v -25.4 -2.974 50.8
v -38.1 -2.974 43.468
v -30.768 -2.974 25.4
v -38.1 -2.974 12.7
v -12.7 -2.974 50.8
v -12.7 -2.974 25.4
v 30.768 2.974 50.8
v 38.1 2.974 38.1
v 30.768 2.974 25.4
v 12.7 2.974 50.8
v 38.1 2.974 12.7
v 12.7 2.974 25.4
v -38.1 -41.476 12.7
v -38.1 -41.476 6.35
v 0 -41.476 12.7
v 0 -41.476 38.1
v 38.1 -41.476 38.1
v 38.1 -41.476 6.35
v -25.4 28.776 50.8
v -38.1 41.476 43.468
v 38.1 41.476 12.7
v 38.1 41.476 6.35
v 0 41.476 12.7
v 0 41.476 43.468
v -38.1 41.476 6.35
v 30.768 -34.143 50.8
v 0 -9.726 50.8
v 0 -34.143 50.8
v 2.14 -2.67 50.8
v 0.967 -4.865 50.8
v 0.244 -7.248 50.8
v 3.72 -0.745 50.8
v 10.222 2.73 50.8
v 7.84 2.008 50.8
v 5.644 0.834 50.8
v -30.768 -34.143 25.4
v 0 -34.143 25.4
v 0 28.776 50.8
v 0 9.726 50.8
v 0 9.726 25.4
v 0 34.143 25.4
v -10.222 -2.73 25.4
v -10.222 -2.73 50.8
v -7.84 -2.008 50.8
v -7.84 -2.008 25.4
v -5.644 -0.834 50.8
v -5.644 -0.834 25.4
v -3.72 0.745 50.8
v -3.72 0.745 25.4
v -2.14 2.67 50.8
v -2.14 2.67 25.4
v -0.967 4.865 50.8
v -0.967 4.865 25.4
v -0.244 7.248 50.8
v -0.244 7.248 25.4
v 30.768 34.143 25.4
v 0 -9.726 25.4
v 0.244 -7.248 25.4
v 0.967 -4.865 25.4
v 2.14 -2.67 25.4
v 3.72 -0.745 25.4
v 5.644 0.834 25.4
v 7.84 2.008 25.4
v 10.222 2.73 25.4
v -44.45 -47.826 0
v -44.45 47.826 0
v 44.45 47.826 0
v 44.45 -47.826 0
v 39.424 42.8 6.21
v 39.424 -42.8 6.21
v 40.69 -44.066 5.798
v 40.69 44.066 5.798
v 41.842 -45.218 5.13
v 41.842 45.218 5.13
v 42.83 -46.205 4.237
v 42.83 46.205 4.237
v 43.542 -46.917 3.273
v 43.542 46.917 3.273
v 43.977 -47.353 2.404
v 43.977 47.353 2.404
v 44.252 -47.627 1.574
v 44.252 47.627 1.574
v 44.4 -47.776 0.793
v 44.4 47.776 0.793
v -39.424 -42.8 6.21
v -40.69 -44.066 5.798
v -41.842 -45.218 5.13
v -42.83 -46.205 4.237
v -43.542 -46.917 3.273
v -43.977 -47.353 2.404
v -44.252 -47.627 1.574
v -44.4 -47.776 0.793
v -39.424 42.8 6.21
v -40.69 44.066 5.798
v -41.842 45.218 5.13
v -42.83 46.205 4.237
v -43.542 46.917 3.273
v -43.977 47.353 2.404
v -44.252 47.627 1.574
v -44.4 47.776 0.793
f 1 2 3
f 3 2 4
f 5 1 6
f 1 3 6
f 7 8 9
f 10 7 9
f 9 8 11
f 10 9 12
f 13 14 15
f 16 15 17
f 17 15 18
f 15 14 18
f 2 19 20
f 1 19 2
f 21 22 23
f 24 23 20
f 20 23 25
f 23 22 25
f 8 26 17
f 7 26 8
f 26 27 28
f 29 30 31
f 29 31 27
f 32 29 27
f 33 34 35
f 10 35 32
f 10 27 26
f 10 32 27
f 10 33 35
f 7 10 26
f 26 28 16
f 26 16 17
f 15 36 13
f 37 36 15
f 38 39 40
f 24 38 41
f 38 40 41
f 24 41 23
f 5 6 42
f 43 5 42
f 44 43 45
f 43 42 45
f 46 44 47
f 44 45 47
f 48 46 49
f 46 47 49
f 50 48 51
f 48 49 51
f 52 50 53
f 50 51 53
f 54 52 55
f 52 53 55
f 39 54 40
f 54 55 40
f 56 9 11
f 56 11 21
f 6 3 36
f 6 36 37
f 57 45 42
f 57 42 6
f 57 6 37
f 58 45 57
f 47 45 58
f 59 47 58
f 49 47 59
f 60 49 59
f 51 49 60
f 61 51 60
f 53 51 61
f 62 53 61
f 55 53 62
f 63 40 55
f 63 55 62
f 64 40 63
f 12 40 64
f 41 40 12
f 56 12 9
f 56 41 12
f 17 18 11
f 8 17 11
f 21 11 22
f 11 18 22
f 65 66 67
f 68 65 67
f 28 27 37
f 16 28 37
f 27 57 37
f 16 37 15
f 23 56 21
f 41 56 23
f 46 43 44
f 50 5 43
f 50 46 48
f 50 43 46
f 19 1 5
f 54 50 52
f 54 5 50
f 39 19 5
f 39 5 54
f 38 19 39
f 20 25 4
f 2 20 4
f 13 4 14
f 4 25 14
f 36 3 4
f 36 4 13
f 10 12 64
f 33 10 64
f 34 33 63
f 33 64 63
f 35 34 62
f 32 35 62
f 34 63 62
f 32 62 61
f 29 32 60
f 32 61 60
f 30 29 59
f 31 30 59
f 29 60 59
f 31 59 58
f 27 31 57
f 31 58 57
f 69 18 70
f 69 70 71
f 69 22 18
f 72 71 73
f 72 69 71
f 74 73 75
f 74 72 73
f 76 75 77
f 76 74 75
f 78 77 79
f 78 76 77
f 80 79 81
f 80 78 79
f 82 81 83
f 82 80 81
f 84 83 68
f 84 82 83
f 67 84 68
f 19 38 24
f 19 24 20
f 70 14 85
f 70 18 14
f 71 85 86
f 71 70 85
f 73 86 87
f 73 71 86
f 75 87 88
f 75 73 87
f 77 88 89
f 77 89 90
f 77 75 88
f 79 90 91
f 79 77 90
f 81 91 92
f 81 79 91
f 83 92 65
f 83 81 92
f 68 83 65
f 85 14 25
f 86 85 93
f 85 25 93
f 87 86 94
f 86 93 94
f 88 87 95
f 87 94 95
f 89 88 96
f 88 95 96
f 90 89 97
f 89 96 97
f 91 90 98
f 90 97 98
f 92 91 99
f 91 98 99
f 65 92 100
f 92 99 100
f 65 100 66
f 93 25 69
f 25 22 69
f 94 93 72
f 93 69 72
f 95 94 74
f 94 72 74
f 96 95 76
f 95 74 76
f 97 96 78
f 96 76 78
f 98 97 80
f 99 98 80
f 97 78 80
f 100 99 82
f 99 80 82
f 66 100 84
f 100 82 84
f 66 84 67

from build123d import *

# Parameters (mm, degrees)
F0_W        = 88.8999994576
F0_H        = 95.6510528922
F1_DEPTH    = 6.35
F2_DEPTH    = 25.4
F3_DEPTH    = 50.8
F4_R        = 6.34999
F5_SIZE2    = 7.3323484187
F5_SIZE     = 12.7
F6_C1_SIZE2 = 12.7
F6_C1_SIZE  = 7.3323484187
F6_C2_SIZE2 = 7.3323484187
F6_C2_SIZE  = 12.7
F6_C3_SIZE2 = 12.7
F6_C3_SIZE  = 7.3323484187
F6_C4_SIZE2 = 7.3323484187
F6_C4_SIZE  = 12.7


# Not quite as in the source:
# - a fillet or chamfer is up to 0.001 mm smaller than in the source, because OpenCascade refuses the exact size


with BuildPart() as f1:
    # F0 (on Top) → F1 (new body)
    with BuildSketch(Plane.XY):
        Rectangle(F0_W, F0_H)
        Polygon((-2.712e-07, 41.4755269885), (38.0999997288, 41.4755269885), (38.0999997288, 2.9744735539), (38.0999997288, -41.4755264461), (-2.712e-07, -41.4755264461), (-38.1000002712, -41.4755264461), (-38.1000002712, -2.9744730115), (-38.1000002712, 41.4755269885), align=None, mode=Mode.SUBTRACT)
    extrude(amount=F1_DEPTH)

    # F0 (on Top) → F2 (join)
    with BuildSketch(Plane.XY):
        with BuildLine():
            Line((38.0999997288, 2.9744735539), (38.0999997288, 41.4755269885))
            Line((38.0999997288, 41.4755269885), (-2.712e-07, 41.4755269885))
            Line((-2.712e-07, 41.4755269885), (-2.712e-07, 9.7255269885))
            ThreePointArc((-2.712e-07, 9.7255269885), (-3.7197441501, 0.7452708674), (-12.7000002712, -2.9744730115))
            Line((-12.7000002712, -2.9744730115), (-38.1000002712, -2.9744730115))
            Line((-38.1000002712, -2.9744730115), (-38.1000002712, -41.4755264461))
            Line((-38.1000002712, -41.4755264461), (-2.712e-07, -41.4755264461))
            Line((-2.712e-07, -41.4755264461), (-2.712e-07, -9.7255264461))
            ThreePointArc((-2.712e-07, -9.7255264461), (3.7197436077, -0.745270325), (12.6999997288, 2.9744735539))
            Line((12.6999997288, 2.9744735539), (38.0999997288, 2.9744735539))
        make_face()
    extrude(amount=F2_DEPTH)

    # F0 (on Top) → F3 (join)
    with BuildSketch(Plane.XY):
        with BuildLine():
            Line((-2.712e-07, 9.7255269885), (-2.712e-07, 41.4755269885))
            Line((-2.712e-07, 41.4755269885), (-38.1000002712, 41.4755269885))
            Line((-38.1000002712, 41.4755269885), (-38.1000002712, -2.9744730115))
            Line((-38.1000002712, -2.9744730115), (-12.7000002712, -2.9744730115))
            ThreePointArc((-12.7000002712, -2.9744730115), (-3.7197441501, 0.7452708674), (-2.712e-07, 9.7255269885))
        make_face()
        with BuildLine():
            Line((38.0999997288, -41.4755264461), (38.0999997288, 2.9744735539))
            Line((38.0999997288, 2.9744735539), (12.6999997288, 2.9744735539))
            ThreePointArc((12.6999997288, 2.9744735539), (3.7197436077, -0.745270325), (-2.712e-07, -9.7255264461))
            Line((-2.712e-07, -9.7255264461), (-2.712e-07, -41.4755264461))
            Line((-2.712e-07, -41.4755264461), (38.0999997288, -41.4755264461))
        make_face()
    extrude(amount=F3_DEPTH)

    # F4 (radius 6.35 in the source; OpenCascade refuses exactly that, so slightly less here)
    f4_edges = [f1.edges().sort_by_distance(p)[0] for p in [
        (44.45, 0, 6.35),
        (0, -47.825526, 6.35),
        (0, 47.825526, 6.35),
        (-44.45, 0, 6.35),
    ]]
    fillet(f4_edges, radius=F4_R)

    # F5
    f5_edges = [f1.edges().sort_by_distance(p)[0] for p in [
        (38.1, 22.225, 25.4),
        (19.05, 41.475527, 25.4),
        (-38.1, -22.225, 25.4),
        (-19.05, -41.475526, 25.4),
    ]]
    chamfer(f5_edges, length=F5_SIZE, length2=F5_SIZE2)

    # F6: chamfer of 12.7 x 7.3323484187 on 4 edges, made by hand

    # F6_c1
    f6_c1_edges = [f1.edges().sort_by_distance(p)[0] for p in [
        (-19.0500002712, 41.4755269885, 50.8),
    ]]
    f6_c1_side = f1.faces().sort_by_distance((-19.0500002712, 41.4755269885, 50.6533530316))[0]
    chamfer(f6_c1_edges, length=F6_C1_SIZE, length2=F6_C1_SIZE2, reference=f6_c1_side)

    # F6_c2
    f6_c2_edges = [f1.edges().sort_by_distance(p)[0] for p in [
        (38.0999997288, -19.2505264461, 50.8),
    ]]
    f6_c2_side = f1.faces().sort_by_distance((38.0999997288, -19.2505264461, 50.6533530316))[0]
    chamfer(f6_c2_edges, length=F6_C2_SIZE, length2=F6_C2_SIZE2, reference=f6_c2_side)

    # F6_c3
    f6_c3_edges = [f1.edges().sort_by_distance(p)[0] for p in [
        (-38.1000002712, 12.9005269885, 50.8),
    ]]
    f6_c3_side = f1.faces().sort_by_distance((-38.1000002712, 12.9005269885, 50.6533530316))[0]
    chamfer(f6_c3_edges, length=F6_C3_SIZE, length2=F6_C3_SIZE2, reference=f6_c3_side)

    # F6_c4
    f6_c4_edges = [f1.edges().sort_by_distance(p)[0] for p in [
        (15.3838255194, -41.4755264461, 50.8),
    ]]
    f6_c4_side = f1.faces().sort_by_distance((15.3838255194, -41.4755264461, 50.6533530316))[0]
    chamfer(f6_c4_edges, length=F6_C4_SIZE, length2=F6_C4_SIZE2, reference=f6_c4_side)


solid = f1.part
